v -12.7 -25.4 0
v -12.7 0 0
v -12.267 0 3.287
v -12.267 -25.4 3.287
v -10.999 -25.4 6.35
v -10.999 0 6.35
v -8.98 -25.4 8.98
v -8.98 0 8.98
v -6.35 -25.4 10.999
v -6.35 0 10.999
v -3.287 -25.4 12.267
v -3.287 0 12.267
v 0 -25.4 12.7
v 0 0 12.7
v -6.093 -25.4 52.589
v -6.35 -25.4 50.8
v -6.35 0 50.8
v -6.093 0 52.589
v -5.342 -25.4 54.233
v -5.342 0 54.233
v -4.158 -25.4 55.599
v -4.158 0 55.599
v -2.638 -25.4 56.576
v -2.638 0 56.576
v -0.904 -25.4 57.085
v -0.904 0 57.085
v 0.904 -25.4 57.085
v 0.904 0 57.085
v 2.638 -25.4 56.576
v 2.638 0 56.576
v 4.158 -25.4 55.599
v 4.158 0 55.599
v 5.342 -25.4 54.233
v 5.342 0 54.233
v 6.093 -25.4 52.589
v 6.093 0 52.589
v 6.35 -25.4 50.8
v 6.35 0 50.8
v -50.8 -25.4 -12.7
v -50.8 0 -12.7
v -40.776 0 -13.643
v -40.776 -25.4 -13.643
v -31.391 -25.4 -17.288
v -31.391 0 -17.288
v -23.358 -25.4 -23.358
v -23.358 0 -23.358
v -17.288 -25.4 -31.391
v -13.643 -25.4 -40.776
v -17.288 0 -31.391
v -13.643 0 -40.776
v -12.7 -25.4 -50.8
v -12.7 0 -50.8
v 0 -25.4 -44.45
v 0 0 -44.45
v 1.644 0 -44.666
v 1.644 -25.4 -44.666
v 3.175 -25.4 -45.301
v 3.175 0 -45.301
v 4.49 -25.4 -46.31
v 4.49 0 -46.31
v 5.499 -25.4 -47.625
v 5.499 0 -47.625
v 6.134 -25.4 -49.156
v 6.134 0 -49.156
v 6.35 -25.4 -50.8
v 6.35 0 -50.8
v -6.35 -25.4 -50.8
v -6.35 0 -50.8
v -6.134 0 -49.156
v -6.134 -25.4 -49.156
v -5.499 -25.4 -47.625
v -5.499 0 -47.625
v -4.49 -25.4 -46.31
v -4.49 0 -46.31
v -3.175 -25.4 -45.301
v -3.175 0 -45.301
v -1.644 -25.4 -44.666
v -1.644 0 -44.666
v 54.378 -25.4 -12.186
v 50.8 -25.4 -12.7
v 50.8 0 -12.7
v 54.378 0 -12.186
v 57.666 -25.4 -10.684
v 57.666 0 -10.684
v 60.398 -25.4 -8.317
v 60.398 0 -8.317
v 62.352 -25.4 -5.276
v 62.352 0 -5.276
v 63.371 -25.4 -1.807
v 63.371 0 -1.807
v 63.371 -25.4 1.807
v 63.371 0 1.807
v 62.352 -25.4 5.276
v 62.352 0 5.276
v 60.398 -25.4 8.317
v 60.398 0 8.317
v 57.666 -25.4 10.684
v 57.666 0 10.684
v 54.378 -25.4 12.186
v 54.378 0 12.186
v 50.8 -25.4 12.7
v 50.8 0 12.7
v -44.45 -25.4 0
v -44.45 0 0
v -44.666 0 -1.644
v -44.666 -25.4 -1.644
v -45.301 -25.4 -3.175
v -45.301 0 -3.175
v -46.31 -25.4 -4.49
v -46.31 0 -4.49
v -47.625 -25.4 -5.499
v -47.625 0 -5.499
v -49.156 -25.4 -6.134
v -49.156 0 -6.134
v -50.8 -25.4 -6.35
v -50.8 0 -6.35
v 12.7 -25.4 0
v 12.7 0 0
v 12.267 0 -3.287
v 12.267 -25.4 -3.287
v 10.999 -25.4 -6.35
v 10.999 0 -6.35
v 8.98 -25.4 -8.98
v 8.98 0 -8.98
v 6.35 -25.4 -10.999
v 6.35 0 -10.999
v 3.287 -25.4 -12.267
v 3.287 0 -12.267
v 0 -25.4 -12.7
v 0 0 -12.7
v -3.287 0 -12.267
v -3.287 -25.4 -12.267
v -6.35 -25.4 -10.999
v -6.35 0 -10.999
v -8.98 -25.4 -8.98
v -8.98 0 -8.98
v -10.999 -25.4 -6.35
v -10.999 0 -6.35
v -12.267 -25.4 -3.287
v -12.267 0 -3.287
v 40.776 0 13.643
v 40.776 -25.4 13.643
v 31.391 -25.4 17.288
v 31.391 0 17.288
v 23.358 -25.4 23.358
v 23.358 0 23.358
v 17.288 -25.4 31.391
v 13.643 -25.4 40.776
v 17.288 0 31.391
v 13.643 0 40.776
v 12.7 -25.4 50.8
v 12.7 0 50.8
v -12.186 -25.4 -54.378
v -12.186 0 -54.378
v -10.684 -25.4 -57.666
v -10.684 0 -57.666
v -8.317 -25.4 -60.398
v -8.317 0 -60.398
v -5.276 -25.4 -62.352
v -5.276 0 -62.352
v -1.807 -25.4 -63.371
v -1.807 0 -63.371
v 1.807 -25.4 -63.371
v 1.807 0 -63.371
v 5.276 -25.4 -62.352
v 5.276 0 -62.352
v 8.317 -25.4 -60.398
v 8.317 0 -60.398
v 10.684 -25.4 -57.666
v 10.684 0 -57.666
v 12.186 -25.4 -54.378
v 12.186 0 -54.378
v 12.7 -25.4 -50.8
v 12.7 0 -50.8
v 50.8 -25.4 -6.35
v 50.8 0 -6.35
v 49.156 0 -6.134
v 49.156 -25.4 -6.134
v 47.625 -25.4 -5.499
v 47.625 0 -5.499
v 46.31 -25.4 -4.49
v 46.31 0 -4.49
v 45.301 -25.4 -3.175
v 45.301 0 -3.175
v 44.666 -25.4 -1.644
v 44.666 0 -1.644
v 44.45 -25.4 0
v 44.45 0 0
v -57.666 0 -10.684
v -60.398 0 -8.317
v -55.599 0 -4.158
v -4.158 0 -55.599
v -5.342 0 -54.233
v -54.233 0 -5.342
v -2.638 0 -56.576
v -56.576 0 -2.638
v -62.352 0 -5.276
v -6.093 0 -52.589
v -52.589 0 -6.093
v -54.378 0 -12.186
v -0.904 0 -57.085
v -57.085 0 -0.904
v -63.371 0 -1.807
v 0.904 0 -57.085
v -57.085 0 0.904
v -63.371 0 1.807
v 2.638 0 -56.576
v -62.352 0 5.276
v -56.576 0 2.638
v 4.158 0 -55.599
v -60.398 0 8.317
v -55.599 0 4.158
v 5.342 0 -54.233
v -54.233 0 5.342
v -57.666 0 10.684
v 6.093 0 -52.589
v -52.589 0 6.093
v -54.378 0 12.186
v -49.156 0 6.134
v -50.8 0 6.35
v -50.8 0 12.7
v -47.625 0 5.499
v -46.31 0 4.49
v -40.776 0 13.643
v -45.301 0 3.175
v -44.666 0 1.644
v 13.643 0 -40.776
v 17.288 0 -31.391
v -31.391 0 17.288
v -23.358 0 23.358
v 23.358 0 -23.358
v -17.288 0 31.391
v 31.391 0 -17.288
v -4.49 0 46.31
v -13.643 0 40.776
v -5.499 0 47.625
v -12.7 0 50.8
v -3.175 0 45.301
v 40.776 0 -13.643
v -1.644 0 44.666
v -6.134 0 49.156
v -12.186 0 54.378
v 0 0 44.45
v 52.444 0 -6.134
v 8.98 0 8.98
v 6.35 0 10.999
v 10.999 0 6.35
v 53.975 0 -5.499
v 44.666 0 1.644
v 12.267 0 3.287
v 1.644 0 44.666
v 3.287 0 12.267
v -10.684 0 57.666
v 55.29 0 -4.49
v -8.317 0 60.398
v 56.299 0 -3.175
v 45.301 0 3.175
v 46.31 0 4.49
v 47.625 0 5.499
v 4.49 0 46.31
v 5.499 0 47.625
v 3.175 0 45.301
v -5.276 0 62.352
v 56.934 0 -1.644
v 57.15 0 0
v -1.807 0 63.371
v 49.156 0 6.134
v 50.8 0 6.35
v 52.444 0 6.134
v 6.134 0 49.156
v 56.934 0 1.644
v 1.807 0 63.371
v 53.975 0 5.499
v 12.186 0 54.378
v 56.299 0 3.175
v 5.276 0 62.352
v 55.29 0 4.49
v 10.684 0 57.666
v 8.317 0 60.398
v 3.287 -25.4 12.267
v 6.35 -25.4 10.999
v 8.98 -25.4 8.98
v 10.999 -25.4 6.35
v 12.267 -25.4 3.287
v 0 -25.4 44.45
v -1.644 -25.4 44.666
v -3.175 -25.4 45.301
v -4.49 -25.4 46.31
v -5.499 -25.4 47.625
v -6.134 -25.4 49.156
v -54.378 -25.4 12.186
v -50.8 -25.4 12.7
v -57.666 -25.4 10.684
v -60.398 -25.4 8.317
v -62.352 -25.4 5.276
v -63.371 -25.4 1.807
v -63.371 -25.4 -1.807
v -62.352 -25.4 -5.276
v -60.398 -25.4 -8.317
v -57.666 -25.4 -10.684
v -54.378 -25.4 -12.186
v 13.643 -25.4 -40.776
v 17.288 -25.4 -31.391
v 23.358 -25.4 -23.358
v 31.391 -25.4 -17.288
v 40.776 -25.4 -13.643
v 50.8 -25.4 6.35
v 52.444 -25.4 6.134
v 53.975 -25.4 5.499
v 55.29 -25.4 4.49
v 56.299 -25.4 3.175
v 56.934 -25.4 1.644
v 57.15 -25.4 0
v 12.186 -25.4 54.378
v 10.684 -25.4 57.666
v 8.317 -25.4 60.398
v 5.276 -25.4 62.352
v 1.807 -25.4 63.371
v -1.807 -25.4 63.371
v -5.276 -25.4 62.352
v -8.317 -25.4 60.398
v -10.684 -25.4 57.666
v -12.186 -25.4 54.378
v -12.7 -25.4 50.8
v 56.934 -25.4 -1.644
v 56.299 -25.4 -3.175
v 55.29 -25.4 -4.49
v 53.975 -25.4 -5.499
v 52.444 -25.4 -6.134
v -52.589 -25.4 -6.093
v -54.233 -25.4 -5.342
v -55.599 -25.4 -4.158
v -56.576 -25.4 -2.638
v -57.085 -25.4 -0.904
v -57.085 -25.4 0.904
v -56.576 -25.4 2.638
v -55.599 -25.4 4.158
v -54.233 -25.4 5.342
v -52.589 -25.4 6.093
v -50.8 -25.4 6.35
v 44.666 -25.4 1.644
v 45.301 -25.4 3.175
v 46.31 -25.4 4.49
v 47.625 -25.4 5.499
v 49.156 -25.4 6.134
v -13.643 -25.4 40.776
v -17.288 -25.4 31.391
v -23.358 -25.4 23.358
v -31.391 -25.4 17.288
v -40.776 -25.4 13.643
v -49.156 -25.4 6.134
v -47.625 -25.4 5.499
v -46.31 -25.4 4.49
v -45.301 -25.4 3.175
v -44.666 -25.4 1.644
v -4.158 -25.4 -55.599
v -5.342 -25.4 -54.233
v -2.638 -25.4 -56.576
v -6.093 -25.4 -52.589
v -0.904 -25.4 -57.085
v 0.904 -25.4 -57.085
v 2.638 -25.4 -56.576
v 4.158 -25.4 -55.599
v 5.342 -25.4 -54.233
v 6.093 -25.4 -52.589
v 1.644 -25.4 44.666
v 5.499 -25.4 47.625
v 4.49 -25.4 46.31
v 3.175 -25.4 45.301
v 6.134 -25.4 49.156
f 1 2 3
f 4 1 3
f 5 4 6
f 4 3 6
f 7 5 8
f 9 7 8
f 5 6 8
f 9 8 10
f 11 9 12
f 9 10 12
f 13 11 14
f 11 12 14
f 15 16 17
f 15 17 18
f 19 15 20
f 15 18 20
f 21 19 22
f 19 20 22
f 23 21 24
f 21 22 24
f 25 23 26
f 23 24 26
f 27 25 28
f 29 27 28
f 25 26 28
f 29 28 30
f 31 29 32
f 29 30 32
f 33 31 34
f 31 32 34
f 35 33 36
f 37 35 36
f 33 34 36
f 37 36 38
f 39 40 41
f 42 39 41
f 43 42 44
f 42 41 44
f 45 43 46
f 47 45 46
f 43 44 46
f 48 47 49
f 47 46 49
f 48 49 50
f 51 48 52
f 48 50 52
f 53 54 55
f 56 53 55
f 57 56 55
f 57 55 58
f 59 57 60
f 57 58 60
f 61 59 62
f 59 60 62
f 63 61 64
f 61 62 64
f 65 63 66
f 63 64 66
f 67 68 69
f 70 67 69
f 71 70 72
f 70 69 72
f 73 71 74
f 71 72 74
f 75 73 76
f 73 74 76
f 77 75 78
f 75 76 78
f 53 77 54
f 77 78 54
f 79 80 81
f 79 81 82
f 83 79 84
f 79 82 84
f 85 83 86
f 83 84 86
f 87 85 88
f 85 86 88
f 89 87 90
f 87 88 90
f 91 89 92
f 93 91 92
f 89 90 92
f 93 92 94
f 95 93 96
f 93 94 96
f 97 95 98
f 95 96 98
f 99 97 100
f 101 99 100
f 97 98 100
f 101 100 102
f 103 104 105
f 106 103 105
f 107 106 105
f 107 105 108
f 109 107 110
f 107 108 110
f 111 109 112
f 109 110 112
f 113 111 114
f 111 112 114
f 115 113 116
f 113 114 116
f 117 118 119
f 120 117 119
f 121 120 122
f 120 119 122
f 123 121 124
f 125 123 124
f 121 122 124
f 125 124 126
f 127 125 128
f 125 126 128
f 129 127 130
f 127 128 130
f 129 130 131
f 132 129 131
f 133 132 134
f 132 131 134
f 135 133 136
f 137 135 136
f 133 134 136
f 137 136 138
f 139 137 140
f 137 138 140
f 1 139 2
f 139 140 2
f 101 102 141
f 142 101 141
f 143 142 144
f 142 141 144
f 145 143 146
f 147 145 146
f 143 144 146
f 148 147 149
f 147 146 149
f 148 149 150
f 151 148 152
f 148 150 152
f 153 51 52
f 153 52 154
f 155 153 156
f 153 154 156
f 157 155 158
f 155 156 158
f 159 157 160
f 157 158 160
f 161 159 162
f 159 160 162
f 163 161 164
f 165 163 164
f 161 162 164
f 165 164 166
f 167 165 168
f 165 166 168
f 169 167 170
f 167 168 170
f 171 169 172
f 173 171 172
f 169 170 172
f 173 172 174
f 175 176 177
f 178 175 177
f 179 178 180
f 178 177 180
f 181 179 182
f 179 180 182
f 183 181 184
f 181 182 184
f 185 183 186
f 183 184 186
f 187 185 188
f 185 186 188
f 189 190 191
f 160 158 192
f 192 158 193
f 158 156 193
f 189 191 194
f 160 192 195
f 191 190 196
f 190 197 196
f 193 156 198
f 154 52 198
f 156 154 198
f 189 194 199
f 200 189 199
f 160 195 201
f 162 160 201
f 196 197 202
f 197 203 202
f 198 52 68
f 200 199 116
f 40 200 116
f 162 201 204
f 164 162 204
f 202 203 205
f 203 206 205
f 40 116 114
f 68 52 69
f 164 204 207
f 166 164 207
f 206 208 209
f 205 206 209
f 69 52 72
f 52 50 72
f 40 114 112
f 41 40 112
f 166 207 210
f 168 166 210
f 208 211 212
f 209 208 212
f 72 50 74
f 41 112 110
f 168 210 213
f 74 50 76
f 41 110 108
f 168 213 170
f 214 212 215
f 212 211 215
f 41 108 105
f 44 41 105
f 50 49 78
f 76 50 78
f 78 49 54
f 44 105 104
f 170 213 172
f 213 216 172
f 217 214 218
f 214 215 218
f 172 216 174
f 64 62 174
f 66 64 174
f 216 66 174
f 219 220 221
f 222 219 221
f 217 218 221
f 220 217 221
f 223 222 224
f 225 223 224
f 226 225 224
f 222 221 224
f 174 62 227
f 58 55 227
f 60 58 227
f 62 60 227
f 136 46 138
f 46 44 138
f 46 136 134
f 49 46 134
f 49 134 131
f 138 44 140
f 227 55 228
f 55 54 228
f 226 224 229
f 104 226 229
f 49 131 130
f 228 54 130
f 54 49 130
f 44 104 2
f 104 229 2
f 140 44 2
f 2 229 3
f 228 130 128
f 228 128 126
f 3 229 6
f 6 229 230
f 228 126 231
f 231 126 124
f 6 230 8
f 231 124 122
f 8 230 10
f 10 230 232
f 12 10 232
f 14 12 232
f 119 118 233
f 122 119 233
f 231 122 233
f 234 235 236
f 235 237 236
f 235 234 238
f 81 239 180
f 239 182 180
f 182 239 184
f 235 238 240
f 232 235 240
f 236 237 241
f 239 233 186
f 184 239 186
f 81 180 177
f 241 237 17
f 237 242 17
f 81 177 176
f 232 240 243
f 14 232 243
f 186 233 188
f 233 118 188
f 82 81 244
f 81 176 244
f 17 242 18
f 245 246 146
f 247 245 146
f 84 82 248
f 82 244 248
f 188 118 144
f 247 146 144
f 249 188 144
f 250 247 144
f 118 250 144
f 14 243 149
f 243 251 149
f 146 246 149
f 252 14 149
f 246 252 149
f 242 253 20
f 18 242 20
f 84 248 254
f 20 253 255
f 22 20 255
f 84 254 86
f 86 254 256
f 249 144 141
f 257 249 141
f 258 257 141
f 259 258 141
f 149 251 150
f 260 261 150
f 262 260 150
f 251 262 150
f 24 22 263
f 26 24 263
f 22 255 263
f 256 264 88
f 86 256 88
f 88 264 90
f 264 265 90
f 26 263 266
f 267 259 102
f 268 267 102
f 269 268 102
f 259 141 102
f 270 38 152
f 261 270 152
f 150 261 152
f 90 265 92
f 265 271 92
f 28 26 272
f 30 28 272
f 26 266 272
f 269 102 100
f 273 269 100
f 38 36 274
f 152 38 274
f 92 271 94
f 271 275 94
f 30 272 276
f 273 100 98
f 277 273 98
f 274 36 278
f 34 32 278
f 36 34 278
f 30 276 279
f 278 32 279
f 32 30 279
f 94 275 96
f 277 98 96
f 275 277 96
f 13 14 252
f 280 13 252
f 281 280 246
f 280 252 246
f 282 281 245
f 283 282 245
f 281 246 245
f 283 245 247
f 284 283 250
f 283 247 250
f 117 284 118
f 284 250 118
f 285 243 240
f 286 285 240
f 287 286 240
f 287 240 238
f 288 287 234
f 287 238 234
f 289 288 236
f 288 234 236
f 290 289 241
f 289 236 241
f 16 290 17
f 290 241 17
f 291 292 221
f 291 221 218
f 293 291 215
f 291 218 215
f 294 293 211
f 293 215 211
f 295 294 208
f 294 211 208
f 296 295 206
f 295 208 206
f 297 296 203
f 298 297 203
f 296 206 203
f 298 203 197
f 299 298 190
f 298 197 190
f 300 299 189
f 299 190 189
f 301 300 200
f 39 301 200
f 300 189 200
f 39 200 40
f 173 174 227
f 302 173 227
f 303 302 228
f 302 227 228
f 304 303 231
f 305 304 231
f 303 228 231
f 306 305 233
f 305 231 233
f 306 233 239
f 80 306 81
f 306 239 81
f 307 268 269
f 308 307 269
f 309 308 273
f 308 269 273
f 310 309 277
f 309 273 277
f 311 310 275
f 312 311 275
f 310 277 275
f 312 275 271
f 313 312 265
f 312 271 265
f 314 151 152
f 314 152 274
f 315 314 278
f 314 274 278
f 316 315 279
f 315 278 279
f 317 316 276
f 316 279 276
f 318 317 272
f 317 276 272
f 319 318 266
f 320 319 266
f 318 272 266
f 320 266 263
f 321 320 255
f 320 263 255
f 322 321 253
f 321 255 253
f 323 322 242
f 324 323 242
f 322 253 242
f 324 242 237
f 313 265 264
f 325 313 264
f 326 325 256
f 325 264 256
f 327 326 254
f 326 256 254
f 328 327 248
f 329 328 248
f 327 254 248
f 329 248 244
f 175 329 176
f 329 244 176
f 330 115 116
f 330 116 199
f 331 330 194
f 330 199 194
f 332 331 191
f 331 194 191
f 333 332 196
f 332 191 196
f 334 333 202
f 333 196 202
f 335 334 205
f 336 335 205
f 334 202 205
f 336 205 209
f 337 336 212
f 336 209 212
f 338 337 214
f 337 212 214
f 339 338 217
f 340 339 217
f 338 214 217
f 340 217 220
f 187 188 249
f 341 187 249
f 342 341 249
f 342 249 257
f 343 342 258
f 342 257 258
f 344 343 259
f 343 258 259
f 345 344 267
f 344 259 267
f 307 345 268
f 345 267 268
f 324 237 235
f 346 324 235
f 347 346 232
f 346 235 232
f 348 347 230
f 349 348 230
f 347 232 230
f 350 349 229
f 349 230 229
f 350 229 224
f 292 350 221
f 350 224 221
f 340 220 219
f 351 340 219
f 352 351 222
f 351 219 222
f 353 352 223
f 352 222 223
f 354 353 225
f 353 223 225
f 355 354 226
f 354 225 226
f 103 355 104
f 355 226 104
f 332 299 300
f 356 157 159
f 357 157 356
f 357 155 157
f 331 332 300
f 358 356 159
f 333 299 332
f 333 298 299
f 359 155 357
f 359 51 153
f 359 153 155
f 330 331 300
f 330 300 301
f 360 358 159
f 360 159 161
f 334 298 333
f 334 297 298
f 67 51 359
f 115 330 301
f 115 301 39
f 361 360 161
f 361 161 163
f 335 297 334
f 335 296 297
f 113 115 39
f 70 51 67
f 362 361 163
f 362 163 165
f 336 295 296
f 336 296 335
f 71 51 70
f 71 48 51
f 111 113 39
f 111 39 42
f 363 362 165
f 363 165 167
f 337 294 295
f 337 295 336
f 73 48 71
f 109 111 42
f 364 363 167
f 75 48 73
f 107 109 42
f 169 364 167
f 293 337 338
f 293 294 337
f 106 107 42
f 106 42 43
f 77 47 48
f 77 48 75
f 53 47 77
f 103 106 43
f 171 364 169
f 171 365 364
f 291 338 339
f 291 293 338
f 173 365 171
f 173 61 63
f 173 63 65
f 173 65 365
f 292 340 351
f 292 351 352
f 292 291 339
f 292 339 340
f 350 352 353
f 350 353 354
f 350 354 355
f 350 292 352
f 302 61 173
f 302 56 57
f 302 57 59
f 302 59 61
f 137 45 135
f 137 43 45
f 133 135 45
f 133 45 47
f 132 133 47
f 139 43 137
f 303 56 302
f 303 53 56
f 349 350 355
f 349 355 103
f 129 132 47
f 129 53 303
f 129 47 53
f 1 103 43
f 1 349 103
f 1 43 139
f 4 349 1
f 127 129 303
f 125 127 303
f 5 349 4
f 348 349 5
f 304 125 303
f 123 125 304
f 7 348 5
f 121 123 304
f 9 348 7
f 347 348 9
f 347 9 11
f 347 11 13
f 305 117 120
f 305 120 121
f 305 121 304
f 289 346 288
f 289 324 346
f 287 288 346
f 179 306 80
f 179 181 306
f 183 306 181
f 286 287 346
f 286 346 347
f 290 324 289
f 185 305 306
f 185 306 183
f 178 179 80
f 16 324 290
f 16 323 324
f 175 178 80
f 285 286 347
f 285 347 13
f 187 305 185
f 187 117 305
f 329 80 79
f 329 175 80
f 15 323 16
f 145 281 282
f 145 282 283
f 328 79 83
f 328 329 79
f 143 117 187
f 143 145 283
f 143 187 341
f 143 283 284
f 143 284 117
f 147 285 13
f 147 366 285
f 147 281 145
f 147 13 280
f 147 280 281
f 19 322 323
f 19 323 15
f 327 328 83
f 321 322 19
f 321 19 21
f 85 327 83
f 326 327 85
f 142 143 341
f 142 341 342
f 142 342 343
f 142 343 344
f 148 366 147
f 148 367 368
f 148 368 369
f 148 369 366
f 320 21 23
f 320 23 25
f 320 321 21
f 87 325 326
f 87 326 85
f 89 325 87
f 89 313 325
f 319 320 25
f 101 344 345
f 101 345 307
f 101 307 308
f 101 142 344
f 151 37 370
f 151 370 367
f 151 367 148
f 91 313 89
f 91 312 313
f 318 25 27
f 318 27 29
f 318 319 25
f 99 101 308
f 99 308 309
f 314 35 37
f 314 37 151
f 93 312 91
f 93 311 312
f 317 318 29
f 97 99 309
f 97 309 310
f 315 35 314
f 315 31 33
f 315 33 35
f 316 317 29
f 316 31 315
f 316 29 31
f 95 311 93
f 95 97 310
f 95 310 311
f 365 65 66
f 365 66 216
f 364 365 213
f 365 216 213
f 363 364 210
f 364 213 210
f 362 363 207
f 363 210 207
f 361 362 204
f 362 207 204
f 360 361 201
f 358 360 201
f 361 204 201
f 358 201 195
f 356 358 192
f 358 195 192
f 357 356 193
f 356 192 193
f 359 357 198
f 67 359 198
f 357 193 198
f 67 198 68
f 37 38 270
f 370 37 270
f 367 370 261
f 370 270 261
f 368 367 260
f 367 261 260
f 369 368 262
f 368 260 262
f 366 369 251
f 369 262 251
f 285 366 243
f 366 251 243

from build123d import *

# Parameters (mm, degrees)
F1_DEPTH = 25.4


with BuildPart() as f1:
    # F0 (on Front) → F1 (new body)
    with BuildSketch(Plane.XZ):
        with BuildLine():
            Line((44.45, 0), (12.7, 0))
            ThreePointArc((12.7, 0), (8.980256, -8.980256), (0, -12.7))
            Line((0, -12.7), (0, -44.45))
            ThreePointArc((0, -44.45), (4.490128, -46.309872), (6.35, -50.8))
            Line((6.35, -50.8), (12.7, -50.8))
            ThreePointArc((12.7, -50.8), (23.358147, -23.358147), (50.8, -12.7))
            Line((50.8, -12.7), (50.8, -6.35))
            ThreePointArc((50.8, -6.35), (46.309872, -4.490128), (44.45, 0))
        make_face()
        with BuildLine():
            ThreePointArc((0, 12.7), (8.980256, 8.980256), (12.7, 0))
            Line((12.7, 0), (44.45, 0))
            ThreePointArc((44.45, 0), (46.309872, 4.490128), (50.8, 6.35))
            Line((50.8, 6.35), (50.8, 12.7))
            ThreePointArc((50.8, 12.7), (23.358147, 23.358147), (12.7, 50.8))
            Line((12.7, 50.8), (6.35, 50.8))
            ThreePointArc((6.35, 50.8), (4.490128, 46.309872), (0, 44.45))
            Line((0, 44.45), (0, 12.7))
        make_face()
        with BuildLine():
            ThreePointArc((-12.7, 0), (-8.980256, 8.980256), (0, 12.7))
            Line((0, 12.7), (0, 44.45))
            ThreePointArc((0, 44.45), (-4.490128, 46.309872), (-6.35, 50.8))
            Line((-6.35, 50.8), (-12.7, 50.8))
            ThreePointArc((-12.7, 50.8), (-23.358147, 23.358147), (-50.8, 12.7))
            Line((-50.8, 12.7), (-50.8, 6.35))
            ThreePointArc((-50.8, 6.35), (-46.309872, 4.490128), (-44.45, 0))
            Line((-44.45, 0), (-12.7, 0))
        make_face()
        with BuildLine():
            Line((0, -44.45), (0, -12.7))
            ThreePointArc((0, -12.7), (-8.980256, -8.980256), (-12.7, 0))
            Line((-12.7, 0), (-44.45, 0))
            ThreePointArc((-44.45, 0), (-46.309872, -4.490128), (-50.8, -6.35))
            Line((-50.8, -6.35), (-50.8, -12.7))
            ThreePointArc((-50.8, -12.7), (-23.358147, -23.358147), (-12.7, -50.8))
            Line((-12.7, -50.8), (-6.35, -50.8))
            ThreePointArc((-6.35, -50.8), (-4.490128, -46.309872), (0, -44.45))
        make_face()
        with BuildLine():
            Line((50.8, 12.7), (50.8, 6.35))
            ThreePointArc((50.8, 6.35), (55.290128, 4.490128), (57.15, 0))
            ThreePointArc((57.15, 0), (55.290128, -4.490128), (50.8, -6.35))
            Line((50.8, -6.35), (50.8, -12.7))
            ThreePointArc((50.8, -12.7), (63.5, 0), (50.8, 12.7))
        make_face()
        with BuildLine():
            Line((-12.7, 50.8), (-6.35, 50.8))
            ThreePointArc((-6.35, 50.8), (0, 57.15), (6.35, 50.8))
            Line((6.35, 50.8), (12.7, 50.8))
            ThreePointArc((12.7, 50.8), (0, 63.5), (-12.7, 50.8))
        make_face()
        with BuildLine():
            Line((12.7, -50.8), (6.35, -50.8))
            ThreePointArc((6.35, -50.8), (0, -57.15), (-6.35, -50.8))
            Line((-6.35, -50.8), (-12.7, -50.8))
            ThreePointArc((-12.7, -50.8), (0, -63.5), (12.7, -50.8))
        make_face()
        with BuildLine():
            ThreePointArc((-50.8, -6.35), (-57.15, 0), (-50.8, 6.35))
            Line((-50.8, 6.35), (-50.8, 12.7))
            ThreePointArc((-50.8, 12.7), (-63.5, 0), (-50.8, -12.7))
            Line((-50.8, -12.7), (-50.8, -6.35))
        make_face()
    extrude(amount=F1_DEPTH)


solid = f1.part
